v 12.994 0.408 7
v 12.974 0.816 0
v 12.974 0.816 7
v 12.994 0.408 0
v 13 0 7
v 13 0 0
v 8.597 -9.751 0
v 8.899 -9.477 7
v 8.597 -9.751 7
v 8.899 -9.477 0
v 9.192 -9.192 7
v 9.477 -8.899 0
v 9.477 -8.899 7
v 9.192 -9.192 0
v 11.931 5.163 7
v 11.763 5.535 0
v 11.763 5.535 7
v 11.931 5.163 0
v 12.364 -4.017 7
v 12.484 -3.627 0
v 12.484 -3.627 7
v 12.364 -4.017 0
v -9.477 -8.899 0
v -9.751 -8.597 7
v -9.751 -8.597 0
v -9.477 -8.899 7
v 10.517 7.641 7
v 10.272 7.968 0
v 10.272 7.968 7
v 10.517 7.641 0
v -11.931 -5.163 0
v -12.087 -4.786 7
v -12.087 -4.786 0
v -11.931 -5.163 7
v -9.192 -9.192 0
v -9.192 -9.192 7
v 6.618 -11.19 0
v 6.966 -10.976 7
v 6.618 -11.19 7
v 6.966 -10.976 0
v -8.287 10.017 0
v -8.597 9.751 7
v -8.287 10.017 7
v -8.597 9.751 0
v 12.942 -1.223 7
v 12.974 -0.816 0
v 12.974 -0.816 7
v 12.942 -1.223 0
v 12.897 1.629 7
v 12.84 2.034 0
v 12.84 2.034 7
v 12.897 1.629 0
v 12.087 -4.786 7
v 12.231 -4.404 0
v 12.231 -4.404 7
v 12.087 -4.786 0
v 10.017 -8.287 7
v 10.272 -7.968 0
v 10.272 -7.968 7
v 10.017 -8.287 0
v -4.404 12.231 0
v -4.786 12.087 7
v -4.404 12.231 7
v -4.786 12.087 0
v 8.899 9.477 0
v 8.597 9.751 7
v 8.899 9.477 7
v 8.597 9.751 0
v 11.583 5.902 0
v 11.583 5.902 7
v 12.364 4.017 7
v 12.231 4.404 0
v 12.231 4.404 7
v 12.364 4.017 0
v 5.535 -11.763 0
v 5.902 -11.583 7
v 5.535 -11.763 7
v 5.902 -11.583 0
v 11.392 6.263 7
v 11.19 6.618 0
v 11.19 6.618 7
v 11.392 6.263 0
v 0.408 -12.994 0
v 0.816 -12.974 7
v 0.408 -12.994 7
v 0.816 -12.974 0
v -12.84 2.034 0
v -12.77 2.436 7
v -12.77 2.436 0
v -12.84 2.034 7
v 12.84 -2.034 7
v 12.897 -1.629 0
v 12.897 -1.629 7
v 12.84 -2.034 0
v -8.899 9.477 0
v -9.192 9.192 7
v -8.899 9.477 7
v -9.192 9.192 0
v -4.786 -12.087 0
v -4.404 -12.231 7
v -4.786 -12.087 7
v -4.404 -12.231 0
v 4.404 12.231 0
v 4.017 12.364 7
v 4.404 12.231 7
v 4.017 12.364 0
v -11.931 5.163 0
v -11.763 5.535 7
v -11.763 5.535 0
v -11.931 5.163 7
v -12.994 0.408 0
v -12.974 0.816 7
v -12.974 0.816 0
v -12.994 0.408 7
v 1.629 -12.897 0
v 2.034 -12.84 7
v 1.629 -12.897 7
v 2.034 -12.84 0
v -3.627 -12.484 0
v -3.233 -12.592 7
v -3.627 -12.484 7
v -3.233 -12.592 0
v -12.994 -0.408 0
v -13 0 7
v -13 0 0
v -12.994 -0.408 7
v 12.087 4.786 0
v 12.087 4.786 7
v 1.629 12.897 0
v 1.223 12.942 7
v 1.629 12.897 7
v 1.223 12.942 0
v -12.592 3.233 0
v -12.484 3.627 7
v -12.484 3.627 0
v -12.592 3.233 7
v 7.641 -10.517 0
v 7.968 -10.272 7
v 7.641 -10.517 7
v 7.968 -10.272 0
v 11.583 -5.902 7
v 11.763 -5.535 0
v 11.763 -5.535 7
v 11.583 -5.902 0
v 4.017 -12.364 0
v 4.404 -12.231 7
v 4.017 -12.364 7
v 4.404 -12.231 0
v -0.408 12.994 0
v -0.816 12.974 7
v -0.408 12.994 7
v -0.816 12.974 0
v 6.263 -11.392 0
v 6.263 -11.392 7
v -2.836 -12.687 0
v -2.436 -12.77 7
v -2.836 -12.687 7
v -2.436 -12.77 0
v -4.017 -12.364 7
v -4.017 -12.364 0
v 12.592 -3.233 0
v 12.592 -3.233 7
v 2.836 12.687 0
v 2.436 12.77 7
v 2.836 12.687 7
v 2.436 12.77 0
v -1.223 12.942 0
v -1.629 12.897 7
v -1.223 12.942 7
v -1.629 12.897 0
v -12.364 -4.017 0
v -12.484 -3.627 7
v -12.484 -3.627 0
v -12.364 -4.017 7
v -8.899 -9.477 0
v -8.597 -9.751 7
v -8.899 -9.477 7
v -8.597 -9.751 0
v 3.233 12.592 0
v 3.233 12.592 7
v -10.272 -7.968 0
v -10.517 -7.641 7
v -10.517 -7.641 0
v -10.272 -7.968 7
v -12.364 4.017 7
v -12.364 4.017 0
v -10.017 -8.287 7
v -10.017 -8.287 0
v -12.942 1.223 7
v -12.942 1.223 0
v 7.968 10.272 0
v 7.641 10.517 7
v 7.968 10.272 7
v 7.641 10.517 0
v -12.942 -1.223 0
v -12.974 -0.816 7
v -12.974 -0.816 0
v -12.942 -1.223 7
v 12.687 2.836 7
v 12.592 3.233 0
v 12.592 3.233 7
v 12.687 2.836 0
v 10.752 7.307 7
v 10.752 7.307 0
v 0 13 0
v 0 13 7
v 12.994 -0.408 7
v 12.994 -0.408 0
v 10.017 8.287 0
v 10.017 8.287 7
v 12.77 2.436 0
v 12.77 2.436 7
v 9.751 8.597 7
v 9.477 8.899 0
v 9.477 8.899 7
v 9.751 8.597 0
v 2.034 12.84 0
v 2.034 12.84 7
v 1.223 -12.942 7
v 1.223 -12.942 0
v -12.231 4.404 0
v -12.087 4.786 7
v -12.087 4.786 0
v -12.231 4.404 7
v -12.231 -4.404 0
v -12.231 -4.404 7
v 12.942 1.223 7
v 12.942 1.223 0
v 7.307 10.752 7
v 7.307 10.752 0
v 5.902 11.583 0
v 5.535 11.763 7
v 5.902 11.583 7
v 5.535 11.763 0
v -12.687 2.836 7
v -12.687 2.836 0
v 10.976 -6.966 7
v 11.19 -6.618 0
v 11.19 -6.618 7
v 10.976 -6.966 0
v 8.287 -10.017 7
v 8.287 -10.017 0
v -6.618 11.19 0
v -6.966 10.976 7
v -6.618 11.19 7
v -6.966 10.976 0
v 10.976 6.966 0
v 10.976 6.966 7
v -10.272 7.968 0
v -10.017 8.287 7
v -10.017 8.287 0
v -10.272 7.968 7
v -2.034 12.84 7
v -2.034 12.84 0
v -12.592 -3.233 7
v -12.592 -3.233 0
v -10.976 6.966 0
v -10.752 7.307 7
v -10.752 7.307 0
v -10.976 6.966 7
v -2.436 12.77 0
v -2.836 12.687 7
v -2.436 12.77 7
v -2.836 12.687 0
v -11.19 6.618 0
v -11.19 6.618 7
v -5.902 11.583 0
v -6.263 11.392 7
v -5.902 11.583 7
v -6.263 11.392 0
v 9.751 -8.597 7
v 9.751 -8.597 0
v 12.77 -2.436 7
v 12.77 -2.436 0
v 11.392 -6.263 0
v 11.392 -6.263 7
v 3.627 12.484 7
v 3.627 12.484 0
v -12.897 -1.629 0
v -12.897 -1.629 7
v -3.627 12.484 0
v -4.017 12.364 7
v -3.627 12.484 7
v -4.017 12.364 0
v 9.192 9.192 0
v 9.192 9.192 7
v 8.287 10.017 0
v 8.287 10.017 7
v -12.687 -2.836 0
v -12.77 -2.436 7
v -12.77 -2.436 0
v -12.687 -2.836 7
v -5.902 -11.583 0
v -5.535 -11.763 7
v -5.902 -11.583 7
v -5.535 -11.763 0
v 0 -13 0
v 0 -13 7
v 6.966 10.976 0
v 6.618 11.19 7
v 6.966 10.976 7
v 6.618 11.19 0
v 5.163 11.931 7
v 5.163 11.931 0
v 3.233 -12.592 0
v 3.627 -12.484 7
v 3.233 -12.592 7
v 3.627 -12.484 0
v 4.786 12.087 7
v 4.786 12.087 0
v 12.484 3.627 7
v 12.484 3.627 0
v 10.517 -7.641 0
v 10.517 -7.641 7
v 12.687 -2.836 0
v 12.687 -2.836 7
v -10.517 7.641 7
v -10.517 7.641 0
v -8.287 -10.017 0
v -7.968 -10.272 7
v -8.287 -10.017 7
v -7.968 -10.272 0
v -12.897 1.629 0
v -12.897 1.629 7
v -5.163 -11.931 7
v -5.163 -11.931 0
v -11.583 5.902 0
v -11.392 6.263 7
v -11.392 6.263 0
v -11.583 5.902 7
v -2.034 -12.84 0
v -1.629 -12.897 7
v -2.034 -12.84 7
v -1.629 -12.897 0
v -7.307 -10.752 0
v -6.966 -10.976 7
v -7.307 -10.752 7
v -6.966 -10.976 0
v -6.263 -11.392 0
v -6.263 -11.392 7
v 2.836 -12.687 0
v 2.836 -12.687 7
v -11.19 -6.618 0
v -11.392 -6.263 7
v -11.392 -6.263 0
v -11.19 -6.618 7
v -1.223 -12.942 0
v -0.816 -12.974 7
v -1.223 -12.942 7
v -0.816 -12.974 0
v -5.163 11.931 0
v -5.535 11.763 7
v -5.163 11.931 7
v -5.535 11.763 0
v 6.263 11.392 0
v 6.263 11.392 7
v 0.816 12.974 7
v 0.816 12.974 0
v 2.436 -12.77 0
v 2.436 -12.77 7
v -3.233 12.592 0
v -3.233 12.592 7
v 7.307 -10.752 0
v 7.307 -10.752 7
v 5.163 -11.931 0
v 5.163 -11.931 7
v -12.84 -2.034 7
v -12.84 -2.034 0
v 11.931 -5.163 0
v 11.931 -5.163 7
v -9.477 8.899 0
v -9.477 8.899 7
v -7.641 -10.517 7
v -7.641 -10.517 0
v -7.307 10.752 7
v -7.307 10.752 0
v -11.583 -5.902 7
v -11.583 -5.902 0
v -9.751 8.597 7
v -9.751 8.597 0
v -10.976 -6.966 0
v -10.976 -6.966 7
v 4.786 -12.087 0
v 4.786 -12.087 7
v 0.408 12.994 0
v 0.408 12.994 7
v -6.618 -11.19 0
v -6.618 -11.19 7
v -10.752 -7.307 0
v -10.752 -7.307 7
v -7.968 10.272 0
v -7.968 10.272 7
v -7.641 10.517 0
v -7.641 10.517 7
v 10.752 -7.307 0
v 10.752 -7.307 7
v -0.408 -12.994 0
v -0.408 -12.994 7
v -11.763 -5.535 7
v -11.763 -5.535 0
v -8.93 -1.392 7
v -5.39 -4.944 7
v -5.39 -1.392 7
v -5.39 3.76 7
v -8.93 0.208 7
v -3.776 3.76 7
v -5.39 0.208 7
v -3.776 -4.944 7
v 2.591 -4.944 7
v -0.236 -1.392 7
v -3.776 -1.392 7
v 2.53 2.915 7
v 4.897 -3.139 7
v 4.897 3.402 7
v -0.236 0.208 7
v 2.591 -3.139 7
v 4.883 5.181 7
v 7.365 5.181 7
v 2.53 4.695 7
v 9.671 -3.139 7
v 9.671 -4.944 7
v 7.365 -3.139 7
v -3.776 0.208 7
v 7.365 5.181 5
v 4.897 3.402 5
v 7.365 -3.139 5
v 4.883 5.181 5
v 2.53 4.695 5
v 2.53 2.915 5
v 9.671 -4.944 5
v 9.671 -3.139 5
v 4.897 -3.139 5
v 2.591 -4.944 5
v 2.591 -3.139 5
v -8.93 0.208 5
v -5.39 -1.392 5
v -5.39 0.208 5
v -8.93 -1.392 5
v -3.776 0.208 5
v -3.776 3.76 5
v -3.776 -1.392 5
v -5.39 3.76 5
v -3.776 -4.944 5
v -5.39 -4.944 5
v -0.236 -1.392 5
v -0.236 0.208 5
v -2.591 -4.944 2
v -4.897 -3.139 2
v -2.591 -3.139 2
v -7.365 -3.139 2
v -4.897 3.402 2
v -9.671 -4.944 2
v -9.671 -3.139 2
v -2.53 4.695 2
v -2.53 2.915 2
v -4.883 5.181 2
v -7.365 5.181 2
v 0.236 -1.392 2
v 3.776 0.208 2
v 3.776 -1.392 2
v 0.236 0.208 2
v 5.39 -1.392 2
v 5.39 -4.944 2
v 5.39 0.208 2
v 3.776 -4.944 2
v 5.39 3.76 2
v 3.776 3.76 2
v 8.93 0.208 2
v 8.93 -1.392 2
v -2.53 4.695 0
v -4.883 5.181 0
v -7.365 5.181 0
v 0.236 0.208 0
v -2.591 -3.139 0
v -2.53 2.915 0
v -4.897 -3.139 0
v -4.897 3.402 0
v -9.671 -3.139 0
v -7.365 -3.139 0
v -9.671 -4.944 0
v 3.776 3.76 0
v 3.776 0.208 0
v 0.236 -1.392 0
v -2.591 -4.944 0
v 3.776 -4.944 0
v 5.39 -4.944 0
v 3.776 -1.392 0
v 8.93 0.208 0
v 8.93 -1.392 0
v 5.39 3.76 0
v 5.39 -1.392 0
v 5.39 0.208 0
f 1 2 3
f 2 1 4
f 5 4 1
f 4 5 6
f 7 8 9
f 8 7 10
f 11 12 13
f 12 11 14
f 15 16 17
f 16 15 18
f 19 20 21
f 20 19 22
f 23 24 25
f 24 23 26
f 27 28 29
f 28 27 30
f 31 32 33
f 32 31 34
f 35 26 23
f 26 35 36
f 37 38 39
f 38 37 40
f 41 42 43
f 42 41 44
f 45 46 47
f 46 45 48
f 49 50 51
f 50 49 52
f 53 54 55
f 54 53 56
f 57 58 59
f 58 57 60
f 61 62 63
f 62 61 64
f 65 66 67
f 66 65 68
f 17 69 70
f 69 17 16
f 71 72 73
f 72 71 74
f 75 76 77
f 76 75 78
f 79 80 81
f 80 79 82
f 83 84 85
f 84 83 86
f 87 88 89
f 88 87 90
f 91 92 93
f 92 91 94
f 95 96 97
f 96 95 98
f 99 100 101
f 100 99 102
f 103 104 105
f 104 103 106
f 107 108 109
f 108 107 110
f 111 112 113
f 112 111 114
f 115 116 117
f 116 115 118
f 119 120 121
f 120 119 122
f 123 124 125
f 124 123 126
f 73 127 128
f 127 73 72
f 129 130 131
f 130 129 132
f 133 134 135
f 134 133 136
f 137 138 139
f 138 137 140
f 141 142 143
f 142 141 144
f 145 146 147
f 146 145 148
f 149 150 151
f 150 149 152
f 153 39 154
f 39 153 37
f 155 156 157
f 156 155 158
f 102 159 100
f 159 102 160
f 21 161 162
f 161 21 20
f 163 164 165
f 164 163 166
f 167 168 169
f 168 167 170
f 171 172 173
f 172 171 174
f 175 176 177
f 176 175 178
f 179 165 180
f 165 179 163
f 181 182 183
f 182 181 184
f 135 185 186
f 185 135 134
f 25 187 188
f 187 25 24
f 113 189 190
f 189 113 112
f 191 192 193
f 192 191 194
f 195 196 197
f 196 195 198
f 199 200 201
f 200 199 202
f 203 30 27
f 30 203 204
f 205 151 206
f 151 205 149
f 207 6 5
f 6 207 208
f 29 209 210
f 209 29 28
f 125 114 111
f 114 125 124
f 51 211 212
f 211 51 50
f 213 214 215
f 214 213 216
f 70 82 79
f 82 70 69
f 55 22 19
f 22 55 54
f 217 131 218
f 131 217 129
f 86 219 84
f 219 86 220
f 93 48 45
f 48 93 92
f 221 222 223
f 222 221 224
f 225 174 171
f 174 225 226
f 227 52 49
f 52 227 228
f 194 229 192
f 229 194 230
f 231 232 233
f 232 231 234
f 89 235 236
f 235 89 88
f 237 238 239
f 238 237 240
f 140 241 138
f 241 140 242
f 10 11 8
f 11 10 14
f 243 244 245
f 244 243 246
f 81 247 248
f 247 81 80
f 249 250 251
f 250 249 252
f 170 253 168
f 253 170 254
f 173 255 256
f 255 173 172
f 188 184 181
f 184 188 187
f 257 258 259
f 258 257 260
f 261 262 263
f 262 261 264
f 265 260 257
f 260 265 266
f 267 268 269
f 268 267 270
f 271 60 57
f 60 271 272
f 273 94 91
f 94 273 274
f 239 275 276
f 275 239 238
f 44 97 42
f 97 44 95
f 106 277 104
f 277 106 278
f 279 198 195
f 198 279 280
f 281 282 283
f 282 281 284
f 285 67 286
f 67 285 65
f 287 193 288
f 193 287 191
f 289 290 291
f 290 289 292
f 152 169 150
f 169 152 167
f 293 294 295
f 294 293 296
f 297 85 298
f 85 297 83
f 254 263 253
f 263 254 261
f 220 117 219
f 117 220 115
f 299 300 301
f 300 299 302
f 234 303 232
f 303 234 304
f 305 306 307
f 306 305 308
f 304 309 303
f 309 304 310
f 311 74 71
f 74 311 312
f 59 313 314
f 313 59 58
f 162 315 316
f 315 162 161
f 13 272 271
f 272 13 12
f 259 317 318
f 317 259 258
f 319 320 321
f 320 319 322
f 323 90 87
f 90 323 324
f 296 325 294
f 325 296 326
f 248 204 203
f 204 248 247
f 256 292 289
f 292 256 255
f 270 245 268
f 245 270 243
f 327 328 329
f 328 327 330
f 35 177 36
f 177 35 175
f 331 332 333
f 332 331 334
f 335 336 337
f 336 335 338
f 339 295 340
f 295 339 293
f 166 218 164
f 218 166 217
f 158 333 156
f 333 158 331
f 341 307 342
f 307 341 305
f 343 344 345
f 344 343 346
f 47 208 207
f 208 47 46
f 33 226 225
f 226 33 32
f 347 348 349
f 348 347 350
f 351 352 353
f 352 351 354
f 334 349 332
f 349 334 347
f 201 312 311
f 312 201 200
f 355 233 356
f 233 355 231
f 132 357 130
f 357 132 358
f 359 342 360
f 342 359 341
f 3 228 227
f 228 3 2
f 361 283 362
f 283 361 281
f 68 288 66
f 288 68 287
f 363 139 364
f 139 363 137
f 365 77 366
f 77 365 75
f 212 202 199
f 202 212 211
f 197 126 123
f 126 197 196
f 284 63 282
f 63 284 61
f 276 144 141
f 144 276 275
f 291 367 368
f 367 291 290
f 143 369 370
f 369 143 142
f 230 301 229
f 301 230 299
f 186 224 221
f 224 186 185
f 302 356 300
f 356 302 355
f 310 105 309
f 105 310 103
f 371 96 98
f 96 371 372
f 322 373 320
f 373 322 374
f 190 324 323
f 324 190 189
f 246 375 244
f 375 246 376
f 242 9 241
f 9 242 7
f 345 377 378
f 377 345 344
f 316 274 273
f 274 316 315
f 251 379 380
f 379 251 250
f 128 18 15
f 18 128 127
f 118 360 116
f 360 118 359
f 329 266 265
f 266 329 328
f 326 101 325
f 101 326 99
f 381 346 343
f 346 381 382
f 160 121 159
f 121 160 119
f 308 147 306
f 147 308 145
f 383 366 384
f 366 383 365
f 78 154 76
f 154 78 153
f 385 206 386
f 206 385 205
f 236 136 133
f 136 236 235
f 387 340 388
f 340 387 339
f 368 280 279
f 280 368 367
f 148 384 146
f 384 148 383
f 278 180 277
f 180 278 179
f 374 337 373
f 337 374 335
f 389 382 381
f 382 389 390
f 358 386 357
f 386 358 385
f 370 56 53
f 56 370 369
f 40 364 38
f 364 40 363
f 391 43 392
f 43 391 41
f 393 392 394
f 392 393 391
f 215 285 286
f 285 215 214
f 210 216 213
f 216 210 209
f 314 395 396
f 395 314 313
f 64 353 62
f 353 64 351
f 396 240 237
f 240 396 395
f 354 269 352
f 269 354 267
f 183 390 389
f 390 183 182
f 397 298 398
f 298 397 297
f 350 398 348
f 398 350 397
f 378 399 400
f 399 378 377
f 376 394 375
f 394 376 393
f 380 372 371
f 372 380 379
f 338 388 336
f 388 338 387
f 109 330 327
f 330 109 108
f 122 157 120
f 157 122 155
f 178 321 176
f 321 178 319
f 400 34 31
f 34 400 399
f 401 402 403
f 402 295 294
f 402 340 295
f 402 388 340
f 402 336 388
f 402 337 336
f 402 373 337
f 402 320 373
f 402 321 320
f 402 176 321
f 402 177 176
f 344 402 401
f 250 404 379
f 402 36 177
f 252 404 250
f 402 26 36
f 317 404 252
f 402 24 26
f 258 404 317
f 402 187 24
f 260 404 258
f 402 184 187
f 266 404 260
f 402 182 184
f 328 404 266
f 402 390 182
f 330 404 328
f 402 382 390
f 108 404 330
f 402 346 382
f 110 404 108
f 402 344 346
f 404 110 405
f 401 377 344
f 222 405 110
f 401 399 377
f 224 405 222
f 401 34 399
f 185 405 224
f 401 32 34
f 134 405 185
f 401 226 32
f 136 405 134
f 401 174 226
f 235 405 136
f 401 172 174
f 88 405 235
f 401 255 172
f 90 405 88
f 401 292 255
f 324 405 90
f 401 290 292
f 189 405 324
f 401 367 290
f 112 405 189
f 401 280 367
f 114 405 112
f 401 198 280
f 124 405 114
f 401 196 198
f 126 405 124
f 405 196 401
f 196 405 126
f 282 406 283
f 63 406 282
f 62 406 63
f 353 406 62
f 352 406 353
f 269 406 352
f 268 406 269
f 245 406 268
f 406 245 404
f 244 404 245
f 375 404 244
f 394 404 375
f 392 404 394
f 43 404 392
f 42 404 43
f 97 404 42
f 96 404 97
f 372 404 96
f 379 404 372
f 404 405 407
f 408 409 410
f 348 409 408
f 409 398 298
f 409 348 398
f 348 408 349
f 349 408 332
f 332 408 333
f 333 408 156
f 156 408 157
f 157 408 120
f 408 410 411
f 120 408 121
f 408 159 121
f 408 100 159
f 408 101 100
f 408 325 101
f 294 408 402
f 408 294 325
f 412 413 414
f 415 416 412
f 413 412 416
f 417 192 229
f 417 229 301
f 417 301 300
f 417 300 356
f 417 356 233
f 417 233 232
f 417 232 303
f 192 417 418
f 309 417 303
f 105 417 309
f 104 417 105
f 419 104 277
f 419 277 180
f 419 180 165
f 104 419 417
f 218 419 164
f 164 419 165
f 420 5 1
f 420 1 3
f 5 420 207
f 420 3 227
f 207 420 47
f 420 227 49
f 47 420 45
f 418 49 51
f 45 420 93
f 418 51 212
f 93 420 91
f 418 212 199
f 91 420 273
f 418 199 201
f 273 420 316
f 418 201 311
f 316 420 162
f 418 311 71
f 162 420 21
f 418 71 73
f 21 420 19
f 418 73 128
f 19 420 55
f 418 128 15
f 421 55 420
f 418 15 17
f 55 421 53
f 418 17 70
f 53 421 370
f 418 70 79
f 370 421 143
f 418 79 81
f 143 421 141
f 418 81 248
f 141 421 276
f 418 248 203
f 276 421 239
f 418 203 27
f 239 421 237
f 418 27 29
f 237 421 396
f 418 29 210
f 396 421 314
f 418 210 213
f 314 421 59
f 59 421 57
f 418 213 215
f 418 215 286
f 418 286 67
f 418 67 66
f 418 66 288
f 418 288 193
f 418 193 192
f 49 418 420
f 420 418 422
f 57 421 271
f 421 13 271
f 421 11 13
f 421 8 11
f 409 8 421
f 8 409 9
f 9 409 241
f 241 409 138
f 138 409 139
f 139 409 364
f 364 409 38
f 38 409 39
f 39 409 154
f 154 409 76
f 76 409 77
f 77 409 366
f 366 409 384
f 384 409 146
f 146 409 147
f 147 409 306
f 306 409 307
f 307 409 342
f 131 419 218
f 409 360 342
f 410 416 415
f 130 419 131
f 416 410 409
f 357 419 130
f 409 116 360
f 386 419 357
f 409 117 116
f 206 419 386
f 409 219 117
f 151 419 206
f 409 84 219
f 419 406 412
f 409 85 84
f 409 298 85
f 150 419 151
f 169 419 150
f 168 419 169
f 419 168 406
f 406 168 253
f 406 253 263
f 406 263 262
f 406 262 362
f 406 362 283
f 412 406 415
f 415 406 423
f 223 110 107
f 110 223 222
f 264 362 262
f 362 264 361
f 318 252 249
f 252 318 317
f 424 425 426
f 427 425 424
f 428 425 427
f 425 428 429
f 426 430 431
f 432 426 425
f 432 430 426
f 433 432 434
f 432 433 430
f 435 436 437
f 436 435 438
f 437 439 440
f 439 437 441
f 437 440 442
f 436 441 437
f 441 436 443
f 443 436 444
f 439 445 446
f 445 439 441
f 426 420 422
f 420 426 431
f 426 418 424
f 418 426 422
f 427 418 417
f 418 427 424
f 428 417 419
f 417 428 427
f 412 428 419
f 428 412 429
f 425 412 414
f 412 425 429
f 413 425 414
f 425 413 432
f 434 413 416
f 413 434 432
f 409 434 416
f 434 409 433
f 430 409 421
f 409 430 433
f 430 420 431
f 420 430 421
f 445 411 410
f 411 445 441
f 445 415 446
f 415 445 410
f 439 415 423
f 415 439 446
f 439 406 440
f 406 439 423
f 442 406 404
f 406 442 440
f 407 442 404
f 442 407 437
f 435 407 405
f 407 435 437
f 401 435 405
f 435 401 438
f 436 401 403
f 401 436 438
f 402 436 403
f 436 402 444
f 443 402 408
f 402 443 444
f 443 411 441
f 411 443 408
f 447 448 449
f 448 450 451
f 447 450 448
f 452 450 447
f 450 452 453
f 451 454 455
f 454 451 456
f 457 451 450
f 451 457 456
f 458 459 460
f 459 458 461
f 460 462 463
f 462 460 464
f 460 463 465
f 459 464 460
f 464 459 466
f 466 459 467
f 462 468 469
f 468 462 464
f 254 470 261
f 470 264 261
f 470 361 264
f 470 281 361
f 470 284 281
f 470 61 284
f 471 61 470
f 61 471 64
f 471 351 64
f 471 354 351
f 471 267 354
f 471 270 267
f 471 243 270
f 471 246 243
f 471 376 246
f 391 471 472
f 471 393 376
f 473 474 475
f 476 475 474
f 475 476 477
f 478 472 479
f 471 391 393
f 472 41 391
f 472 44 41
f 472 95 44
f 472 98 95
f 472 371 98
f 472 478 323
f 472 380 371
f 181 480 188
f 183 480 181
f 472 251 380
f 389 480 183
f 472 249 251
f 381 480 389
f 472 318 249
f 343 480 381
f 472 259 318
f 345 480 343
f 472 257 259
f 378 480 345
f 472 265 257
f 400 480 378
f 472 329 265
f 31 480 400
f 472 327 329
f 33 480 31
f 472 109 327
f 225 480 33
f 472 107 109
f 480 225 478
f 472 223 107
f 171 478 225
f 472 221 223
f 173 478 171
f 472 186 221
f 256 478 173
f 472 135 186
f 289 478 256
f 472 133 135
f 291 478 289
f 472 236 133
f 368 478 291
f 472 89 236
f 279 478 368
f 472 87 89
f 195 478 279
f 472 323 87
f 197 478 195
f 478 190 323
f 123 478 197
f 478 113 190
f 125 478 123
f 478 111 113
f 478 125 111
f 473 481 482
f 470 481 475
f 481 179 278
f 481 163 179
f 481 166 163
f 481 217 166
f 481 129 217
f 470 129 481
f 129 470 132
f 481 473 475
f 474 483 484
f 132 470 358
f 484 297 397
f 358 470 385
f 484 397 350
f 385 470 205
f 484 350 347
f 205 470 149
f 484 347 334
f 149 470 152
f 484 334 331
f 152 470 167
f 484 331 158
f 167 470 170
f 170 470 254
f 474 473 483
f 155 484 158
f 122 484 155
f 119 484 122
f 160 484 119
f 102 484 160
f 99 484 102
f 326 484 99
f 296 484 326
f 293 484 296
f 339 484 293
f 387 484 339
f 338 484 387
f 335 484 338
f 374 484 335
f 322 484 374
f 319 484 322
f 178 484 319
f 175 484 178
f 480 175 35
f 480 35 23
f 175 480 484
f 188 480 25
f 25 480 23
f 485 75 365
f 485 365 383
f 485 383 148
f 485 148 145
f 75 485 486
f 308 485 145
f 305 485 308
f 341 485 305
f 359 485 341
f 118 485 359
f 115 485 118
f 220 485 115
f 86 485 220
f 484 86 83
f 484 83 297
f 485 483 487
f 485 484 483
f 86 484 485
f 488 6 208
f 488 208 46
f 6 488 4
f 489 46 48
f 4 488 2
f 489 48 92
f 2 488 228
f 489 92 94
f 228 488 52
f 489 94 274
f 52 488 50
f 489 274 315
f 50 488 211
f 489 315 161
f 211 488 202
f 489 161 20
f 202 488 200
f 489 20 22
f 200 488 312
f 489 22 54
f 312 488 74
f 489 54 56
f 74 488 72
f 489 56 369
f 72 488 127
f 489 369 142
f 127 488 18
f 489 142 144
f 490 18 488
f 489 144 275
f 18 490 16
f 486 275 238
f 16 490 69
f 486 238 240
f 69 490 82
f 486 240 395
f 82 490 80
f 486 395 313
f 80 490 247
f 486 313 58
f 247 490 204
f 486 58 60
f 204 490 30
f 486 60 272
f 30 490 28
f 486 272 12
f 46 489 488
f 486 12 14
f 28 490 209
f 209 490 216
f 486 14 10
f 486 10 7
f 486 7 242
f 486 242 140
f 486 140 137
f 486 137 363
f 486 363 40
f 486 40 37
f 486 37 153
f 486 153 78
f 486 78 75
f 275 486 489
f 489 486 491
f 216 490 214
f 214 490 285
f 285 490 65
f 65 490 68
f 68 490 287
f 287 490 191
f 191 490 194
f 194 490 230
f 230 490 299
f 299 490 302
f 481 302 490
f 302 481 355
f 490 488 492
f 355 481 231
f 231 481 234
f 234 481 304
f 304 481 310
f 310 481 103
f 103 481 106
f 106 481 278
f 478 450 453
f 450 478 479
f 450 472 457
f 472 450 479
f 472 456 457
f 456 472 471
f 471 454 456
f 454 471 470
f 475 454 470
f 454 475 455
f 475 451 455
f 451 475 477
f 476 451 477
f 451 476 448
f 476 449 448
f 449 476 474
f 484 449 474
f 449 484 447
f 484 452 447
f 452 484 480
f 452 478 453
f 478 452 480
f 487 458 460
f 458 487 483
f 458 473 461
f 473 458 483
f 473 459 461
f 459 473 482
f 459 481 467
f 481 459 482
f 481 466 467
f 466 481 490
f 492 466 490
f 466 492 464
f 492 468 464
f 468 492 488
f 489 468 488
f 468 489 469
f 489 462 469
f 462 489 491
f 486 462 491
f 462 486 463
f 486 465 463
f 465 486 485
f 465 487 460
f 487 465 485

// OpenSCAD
// file: coin-library.scad
module structure
(
    radius,
    structureHeight
)
{
    cylinder
    (
        structureHeight,
        radius,
        radius,
        center = false
    );
}

module bothSurfaceDetails
(
    message,
    positiveText,
    structureHeight,
    detailHeight,
    rimThickness,
    radius,
    textSize
)
{
    //Top
    singleSurfaceDetail
    (
        ZPosition  =  structureHeight,
        positiveText = positiveText,
        message = message,
        detailHeight = detailHeight,
        rimThickness = rimThickness,
        radius = radius,
        textSize = textSize,
        flipped = false
    );

    //Bottom
    singleSurfaceDetail
    (
        ZPosition  =  - detailHeight,
        positiveText = positiveText,
        message = message,
        detailHeight = detailHeight,
        rimThickness = rimThickness,
        radius = radius,
        textSize = textSize,
        flipped = true
    );
}

module rim
(
    position,
    removeInterior,
    detailHeight,
    radius,
    rimThickness
)
{
    difference()
    {
        translate
        (
            position
        )
        {
            cylinder
            (
                detailHeight,
                radius,
                radius,
                center = false
            );
        }

        if(removeInterior)
        {
            translate
            (
                position
            )
            {
                cylinder
                (
                    detailHeight + 1,
                    radius - rimThickness,
                    radius - rimThickness,
                    center = false
                );
            }
        }
    }
}

module textFlipper
(
    position,
    string,
    detailHeight,
    textSize,
    needsFlipping = false
)
{
    if(needsFlipping)
    {
        mirror
        (
            [
                1,
                0,
                0
            ]
        )
        {
            3dtext
            (
                position = position,
                string = string,
                detailHeight = detailHeight,
                textSize = textSize
            );
        }
    }
    else
    {
        3dtext
        (
            position = position,
            string = string,
            detailHeight = detailHeight,
            textSize = textSize
        );
    }
}

module singleSurfaceDetail
(
    ZPosition,
    positiveText,
    message,
    detailHeight,
    rimThickness,
    radius,
    textSize,
    flipped = false
)
{
    position = 
    [
        0,
        0,
        ZPosition
    ];
    if(positiveText)
    {
        rim
        (
            position = position,
            removeInterior = true,
            detailHeight = detailHeight,
            radius = radius,
            rimThickness = rimThickness
        );
        textFlipper
        (
            position = position,
            string = message,
            detailHeight = detailHeight,
            needsFlipping = flipped,
            textSize = textSize
        );
    }
    else
    {
        difference()
        {
            rim
            (
                position = position,
                removeInterior = false,
                detailHeight = detailHeight,
                radius = radius,
                rimThickness = rimThickness
            );
            textFlipper
            (
                position = position,
                string = message,
                detailHeight = detailHeight,
                needsFlipping = flipped,
                textSize = textSize
            );
        }
    }
}

module 3dtext
(
    position,
    string,
    detailHeight,
    textSize
)
{
    translate
    (
        position
    )
    {
        linear_extrude(detailHeight)
        {
            text
            (
                text = string,
                size = textSize,
                font = "Liberation:style=Bold",
                valign = "center",
                halign = "center"
            );
        }
    }
}

module coin
(
    message = "TEST",
    positiveText = true,
    topSurfaceOnly = false,
    radius = 30,
    structureHeight = 5,
    detailHeight = 2,
    rimThickness = 2,
    textSize = 12
)
{
    translate
    (
        [
            0,
            0,
            detailHeight
        ]
    )
    {
        structure
        (
            radius = radius,
            structureHeight = structureHeight
        );

        if(topSurfaceOnly)
        {
            singleSurfaceDetail
            (
                ZPosition = structureHeight,
                positiveText = positiveText,
                message = message,
                detailHeight = detailHeight,
                rimThickness = rimThickness,
                radius = radius,
                textSize = textSize,
                flipped = false
            );
        }
        else
        {
            bothSurfaceDetails
            (
                message = message,
                positiveText = positiveText,
                structureHeight = structureHeight,
                detailHeight = detailHeight,
                rimThickness = rimThickness,
                radius = radius,
                textSize = textSize
            );
        }
    }
}

coin();
// main file
use <coin-library.scad>;
$fn = 200;

coin
(
    message = "+1",
    positiveText = false,
    radius = 13,
    structureHeight = 3,
    detailHeight = 2,
    rimThickness = 2,
    textSize = 10
);
